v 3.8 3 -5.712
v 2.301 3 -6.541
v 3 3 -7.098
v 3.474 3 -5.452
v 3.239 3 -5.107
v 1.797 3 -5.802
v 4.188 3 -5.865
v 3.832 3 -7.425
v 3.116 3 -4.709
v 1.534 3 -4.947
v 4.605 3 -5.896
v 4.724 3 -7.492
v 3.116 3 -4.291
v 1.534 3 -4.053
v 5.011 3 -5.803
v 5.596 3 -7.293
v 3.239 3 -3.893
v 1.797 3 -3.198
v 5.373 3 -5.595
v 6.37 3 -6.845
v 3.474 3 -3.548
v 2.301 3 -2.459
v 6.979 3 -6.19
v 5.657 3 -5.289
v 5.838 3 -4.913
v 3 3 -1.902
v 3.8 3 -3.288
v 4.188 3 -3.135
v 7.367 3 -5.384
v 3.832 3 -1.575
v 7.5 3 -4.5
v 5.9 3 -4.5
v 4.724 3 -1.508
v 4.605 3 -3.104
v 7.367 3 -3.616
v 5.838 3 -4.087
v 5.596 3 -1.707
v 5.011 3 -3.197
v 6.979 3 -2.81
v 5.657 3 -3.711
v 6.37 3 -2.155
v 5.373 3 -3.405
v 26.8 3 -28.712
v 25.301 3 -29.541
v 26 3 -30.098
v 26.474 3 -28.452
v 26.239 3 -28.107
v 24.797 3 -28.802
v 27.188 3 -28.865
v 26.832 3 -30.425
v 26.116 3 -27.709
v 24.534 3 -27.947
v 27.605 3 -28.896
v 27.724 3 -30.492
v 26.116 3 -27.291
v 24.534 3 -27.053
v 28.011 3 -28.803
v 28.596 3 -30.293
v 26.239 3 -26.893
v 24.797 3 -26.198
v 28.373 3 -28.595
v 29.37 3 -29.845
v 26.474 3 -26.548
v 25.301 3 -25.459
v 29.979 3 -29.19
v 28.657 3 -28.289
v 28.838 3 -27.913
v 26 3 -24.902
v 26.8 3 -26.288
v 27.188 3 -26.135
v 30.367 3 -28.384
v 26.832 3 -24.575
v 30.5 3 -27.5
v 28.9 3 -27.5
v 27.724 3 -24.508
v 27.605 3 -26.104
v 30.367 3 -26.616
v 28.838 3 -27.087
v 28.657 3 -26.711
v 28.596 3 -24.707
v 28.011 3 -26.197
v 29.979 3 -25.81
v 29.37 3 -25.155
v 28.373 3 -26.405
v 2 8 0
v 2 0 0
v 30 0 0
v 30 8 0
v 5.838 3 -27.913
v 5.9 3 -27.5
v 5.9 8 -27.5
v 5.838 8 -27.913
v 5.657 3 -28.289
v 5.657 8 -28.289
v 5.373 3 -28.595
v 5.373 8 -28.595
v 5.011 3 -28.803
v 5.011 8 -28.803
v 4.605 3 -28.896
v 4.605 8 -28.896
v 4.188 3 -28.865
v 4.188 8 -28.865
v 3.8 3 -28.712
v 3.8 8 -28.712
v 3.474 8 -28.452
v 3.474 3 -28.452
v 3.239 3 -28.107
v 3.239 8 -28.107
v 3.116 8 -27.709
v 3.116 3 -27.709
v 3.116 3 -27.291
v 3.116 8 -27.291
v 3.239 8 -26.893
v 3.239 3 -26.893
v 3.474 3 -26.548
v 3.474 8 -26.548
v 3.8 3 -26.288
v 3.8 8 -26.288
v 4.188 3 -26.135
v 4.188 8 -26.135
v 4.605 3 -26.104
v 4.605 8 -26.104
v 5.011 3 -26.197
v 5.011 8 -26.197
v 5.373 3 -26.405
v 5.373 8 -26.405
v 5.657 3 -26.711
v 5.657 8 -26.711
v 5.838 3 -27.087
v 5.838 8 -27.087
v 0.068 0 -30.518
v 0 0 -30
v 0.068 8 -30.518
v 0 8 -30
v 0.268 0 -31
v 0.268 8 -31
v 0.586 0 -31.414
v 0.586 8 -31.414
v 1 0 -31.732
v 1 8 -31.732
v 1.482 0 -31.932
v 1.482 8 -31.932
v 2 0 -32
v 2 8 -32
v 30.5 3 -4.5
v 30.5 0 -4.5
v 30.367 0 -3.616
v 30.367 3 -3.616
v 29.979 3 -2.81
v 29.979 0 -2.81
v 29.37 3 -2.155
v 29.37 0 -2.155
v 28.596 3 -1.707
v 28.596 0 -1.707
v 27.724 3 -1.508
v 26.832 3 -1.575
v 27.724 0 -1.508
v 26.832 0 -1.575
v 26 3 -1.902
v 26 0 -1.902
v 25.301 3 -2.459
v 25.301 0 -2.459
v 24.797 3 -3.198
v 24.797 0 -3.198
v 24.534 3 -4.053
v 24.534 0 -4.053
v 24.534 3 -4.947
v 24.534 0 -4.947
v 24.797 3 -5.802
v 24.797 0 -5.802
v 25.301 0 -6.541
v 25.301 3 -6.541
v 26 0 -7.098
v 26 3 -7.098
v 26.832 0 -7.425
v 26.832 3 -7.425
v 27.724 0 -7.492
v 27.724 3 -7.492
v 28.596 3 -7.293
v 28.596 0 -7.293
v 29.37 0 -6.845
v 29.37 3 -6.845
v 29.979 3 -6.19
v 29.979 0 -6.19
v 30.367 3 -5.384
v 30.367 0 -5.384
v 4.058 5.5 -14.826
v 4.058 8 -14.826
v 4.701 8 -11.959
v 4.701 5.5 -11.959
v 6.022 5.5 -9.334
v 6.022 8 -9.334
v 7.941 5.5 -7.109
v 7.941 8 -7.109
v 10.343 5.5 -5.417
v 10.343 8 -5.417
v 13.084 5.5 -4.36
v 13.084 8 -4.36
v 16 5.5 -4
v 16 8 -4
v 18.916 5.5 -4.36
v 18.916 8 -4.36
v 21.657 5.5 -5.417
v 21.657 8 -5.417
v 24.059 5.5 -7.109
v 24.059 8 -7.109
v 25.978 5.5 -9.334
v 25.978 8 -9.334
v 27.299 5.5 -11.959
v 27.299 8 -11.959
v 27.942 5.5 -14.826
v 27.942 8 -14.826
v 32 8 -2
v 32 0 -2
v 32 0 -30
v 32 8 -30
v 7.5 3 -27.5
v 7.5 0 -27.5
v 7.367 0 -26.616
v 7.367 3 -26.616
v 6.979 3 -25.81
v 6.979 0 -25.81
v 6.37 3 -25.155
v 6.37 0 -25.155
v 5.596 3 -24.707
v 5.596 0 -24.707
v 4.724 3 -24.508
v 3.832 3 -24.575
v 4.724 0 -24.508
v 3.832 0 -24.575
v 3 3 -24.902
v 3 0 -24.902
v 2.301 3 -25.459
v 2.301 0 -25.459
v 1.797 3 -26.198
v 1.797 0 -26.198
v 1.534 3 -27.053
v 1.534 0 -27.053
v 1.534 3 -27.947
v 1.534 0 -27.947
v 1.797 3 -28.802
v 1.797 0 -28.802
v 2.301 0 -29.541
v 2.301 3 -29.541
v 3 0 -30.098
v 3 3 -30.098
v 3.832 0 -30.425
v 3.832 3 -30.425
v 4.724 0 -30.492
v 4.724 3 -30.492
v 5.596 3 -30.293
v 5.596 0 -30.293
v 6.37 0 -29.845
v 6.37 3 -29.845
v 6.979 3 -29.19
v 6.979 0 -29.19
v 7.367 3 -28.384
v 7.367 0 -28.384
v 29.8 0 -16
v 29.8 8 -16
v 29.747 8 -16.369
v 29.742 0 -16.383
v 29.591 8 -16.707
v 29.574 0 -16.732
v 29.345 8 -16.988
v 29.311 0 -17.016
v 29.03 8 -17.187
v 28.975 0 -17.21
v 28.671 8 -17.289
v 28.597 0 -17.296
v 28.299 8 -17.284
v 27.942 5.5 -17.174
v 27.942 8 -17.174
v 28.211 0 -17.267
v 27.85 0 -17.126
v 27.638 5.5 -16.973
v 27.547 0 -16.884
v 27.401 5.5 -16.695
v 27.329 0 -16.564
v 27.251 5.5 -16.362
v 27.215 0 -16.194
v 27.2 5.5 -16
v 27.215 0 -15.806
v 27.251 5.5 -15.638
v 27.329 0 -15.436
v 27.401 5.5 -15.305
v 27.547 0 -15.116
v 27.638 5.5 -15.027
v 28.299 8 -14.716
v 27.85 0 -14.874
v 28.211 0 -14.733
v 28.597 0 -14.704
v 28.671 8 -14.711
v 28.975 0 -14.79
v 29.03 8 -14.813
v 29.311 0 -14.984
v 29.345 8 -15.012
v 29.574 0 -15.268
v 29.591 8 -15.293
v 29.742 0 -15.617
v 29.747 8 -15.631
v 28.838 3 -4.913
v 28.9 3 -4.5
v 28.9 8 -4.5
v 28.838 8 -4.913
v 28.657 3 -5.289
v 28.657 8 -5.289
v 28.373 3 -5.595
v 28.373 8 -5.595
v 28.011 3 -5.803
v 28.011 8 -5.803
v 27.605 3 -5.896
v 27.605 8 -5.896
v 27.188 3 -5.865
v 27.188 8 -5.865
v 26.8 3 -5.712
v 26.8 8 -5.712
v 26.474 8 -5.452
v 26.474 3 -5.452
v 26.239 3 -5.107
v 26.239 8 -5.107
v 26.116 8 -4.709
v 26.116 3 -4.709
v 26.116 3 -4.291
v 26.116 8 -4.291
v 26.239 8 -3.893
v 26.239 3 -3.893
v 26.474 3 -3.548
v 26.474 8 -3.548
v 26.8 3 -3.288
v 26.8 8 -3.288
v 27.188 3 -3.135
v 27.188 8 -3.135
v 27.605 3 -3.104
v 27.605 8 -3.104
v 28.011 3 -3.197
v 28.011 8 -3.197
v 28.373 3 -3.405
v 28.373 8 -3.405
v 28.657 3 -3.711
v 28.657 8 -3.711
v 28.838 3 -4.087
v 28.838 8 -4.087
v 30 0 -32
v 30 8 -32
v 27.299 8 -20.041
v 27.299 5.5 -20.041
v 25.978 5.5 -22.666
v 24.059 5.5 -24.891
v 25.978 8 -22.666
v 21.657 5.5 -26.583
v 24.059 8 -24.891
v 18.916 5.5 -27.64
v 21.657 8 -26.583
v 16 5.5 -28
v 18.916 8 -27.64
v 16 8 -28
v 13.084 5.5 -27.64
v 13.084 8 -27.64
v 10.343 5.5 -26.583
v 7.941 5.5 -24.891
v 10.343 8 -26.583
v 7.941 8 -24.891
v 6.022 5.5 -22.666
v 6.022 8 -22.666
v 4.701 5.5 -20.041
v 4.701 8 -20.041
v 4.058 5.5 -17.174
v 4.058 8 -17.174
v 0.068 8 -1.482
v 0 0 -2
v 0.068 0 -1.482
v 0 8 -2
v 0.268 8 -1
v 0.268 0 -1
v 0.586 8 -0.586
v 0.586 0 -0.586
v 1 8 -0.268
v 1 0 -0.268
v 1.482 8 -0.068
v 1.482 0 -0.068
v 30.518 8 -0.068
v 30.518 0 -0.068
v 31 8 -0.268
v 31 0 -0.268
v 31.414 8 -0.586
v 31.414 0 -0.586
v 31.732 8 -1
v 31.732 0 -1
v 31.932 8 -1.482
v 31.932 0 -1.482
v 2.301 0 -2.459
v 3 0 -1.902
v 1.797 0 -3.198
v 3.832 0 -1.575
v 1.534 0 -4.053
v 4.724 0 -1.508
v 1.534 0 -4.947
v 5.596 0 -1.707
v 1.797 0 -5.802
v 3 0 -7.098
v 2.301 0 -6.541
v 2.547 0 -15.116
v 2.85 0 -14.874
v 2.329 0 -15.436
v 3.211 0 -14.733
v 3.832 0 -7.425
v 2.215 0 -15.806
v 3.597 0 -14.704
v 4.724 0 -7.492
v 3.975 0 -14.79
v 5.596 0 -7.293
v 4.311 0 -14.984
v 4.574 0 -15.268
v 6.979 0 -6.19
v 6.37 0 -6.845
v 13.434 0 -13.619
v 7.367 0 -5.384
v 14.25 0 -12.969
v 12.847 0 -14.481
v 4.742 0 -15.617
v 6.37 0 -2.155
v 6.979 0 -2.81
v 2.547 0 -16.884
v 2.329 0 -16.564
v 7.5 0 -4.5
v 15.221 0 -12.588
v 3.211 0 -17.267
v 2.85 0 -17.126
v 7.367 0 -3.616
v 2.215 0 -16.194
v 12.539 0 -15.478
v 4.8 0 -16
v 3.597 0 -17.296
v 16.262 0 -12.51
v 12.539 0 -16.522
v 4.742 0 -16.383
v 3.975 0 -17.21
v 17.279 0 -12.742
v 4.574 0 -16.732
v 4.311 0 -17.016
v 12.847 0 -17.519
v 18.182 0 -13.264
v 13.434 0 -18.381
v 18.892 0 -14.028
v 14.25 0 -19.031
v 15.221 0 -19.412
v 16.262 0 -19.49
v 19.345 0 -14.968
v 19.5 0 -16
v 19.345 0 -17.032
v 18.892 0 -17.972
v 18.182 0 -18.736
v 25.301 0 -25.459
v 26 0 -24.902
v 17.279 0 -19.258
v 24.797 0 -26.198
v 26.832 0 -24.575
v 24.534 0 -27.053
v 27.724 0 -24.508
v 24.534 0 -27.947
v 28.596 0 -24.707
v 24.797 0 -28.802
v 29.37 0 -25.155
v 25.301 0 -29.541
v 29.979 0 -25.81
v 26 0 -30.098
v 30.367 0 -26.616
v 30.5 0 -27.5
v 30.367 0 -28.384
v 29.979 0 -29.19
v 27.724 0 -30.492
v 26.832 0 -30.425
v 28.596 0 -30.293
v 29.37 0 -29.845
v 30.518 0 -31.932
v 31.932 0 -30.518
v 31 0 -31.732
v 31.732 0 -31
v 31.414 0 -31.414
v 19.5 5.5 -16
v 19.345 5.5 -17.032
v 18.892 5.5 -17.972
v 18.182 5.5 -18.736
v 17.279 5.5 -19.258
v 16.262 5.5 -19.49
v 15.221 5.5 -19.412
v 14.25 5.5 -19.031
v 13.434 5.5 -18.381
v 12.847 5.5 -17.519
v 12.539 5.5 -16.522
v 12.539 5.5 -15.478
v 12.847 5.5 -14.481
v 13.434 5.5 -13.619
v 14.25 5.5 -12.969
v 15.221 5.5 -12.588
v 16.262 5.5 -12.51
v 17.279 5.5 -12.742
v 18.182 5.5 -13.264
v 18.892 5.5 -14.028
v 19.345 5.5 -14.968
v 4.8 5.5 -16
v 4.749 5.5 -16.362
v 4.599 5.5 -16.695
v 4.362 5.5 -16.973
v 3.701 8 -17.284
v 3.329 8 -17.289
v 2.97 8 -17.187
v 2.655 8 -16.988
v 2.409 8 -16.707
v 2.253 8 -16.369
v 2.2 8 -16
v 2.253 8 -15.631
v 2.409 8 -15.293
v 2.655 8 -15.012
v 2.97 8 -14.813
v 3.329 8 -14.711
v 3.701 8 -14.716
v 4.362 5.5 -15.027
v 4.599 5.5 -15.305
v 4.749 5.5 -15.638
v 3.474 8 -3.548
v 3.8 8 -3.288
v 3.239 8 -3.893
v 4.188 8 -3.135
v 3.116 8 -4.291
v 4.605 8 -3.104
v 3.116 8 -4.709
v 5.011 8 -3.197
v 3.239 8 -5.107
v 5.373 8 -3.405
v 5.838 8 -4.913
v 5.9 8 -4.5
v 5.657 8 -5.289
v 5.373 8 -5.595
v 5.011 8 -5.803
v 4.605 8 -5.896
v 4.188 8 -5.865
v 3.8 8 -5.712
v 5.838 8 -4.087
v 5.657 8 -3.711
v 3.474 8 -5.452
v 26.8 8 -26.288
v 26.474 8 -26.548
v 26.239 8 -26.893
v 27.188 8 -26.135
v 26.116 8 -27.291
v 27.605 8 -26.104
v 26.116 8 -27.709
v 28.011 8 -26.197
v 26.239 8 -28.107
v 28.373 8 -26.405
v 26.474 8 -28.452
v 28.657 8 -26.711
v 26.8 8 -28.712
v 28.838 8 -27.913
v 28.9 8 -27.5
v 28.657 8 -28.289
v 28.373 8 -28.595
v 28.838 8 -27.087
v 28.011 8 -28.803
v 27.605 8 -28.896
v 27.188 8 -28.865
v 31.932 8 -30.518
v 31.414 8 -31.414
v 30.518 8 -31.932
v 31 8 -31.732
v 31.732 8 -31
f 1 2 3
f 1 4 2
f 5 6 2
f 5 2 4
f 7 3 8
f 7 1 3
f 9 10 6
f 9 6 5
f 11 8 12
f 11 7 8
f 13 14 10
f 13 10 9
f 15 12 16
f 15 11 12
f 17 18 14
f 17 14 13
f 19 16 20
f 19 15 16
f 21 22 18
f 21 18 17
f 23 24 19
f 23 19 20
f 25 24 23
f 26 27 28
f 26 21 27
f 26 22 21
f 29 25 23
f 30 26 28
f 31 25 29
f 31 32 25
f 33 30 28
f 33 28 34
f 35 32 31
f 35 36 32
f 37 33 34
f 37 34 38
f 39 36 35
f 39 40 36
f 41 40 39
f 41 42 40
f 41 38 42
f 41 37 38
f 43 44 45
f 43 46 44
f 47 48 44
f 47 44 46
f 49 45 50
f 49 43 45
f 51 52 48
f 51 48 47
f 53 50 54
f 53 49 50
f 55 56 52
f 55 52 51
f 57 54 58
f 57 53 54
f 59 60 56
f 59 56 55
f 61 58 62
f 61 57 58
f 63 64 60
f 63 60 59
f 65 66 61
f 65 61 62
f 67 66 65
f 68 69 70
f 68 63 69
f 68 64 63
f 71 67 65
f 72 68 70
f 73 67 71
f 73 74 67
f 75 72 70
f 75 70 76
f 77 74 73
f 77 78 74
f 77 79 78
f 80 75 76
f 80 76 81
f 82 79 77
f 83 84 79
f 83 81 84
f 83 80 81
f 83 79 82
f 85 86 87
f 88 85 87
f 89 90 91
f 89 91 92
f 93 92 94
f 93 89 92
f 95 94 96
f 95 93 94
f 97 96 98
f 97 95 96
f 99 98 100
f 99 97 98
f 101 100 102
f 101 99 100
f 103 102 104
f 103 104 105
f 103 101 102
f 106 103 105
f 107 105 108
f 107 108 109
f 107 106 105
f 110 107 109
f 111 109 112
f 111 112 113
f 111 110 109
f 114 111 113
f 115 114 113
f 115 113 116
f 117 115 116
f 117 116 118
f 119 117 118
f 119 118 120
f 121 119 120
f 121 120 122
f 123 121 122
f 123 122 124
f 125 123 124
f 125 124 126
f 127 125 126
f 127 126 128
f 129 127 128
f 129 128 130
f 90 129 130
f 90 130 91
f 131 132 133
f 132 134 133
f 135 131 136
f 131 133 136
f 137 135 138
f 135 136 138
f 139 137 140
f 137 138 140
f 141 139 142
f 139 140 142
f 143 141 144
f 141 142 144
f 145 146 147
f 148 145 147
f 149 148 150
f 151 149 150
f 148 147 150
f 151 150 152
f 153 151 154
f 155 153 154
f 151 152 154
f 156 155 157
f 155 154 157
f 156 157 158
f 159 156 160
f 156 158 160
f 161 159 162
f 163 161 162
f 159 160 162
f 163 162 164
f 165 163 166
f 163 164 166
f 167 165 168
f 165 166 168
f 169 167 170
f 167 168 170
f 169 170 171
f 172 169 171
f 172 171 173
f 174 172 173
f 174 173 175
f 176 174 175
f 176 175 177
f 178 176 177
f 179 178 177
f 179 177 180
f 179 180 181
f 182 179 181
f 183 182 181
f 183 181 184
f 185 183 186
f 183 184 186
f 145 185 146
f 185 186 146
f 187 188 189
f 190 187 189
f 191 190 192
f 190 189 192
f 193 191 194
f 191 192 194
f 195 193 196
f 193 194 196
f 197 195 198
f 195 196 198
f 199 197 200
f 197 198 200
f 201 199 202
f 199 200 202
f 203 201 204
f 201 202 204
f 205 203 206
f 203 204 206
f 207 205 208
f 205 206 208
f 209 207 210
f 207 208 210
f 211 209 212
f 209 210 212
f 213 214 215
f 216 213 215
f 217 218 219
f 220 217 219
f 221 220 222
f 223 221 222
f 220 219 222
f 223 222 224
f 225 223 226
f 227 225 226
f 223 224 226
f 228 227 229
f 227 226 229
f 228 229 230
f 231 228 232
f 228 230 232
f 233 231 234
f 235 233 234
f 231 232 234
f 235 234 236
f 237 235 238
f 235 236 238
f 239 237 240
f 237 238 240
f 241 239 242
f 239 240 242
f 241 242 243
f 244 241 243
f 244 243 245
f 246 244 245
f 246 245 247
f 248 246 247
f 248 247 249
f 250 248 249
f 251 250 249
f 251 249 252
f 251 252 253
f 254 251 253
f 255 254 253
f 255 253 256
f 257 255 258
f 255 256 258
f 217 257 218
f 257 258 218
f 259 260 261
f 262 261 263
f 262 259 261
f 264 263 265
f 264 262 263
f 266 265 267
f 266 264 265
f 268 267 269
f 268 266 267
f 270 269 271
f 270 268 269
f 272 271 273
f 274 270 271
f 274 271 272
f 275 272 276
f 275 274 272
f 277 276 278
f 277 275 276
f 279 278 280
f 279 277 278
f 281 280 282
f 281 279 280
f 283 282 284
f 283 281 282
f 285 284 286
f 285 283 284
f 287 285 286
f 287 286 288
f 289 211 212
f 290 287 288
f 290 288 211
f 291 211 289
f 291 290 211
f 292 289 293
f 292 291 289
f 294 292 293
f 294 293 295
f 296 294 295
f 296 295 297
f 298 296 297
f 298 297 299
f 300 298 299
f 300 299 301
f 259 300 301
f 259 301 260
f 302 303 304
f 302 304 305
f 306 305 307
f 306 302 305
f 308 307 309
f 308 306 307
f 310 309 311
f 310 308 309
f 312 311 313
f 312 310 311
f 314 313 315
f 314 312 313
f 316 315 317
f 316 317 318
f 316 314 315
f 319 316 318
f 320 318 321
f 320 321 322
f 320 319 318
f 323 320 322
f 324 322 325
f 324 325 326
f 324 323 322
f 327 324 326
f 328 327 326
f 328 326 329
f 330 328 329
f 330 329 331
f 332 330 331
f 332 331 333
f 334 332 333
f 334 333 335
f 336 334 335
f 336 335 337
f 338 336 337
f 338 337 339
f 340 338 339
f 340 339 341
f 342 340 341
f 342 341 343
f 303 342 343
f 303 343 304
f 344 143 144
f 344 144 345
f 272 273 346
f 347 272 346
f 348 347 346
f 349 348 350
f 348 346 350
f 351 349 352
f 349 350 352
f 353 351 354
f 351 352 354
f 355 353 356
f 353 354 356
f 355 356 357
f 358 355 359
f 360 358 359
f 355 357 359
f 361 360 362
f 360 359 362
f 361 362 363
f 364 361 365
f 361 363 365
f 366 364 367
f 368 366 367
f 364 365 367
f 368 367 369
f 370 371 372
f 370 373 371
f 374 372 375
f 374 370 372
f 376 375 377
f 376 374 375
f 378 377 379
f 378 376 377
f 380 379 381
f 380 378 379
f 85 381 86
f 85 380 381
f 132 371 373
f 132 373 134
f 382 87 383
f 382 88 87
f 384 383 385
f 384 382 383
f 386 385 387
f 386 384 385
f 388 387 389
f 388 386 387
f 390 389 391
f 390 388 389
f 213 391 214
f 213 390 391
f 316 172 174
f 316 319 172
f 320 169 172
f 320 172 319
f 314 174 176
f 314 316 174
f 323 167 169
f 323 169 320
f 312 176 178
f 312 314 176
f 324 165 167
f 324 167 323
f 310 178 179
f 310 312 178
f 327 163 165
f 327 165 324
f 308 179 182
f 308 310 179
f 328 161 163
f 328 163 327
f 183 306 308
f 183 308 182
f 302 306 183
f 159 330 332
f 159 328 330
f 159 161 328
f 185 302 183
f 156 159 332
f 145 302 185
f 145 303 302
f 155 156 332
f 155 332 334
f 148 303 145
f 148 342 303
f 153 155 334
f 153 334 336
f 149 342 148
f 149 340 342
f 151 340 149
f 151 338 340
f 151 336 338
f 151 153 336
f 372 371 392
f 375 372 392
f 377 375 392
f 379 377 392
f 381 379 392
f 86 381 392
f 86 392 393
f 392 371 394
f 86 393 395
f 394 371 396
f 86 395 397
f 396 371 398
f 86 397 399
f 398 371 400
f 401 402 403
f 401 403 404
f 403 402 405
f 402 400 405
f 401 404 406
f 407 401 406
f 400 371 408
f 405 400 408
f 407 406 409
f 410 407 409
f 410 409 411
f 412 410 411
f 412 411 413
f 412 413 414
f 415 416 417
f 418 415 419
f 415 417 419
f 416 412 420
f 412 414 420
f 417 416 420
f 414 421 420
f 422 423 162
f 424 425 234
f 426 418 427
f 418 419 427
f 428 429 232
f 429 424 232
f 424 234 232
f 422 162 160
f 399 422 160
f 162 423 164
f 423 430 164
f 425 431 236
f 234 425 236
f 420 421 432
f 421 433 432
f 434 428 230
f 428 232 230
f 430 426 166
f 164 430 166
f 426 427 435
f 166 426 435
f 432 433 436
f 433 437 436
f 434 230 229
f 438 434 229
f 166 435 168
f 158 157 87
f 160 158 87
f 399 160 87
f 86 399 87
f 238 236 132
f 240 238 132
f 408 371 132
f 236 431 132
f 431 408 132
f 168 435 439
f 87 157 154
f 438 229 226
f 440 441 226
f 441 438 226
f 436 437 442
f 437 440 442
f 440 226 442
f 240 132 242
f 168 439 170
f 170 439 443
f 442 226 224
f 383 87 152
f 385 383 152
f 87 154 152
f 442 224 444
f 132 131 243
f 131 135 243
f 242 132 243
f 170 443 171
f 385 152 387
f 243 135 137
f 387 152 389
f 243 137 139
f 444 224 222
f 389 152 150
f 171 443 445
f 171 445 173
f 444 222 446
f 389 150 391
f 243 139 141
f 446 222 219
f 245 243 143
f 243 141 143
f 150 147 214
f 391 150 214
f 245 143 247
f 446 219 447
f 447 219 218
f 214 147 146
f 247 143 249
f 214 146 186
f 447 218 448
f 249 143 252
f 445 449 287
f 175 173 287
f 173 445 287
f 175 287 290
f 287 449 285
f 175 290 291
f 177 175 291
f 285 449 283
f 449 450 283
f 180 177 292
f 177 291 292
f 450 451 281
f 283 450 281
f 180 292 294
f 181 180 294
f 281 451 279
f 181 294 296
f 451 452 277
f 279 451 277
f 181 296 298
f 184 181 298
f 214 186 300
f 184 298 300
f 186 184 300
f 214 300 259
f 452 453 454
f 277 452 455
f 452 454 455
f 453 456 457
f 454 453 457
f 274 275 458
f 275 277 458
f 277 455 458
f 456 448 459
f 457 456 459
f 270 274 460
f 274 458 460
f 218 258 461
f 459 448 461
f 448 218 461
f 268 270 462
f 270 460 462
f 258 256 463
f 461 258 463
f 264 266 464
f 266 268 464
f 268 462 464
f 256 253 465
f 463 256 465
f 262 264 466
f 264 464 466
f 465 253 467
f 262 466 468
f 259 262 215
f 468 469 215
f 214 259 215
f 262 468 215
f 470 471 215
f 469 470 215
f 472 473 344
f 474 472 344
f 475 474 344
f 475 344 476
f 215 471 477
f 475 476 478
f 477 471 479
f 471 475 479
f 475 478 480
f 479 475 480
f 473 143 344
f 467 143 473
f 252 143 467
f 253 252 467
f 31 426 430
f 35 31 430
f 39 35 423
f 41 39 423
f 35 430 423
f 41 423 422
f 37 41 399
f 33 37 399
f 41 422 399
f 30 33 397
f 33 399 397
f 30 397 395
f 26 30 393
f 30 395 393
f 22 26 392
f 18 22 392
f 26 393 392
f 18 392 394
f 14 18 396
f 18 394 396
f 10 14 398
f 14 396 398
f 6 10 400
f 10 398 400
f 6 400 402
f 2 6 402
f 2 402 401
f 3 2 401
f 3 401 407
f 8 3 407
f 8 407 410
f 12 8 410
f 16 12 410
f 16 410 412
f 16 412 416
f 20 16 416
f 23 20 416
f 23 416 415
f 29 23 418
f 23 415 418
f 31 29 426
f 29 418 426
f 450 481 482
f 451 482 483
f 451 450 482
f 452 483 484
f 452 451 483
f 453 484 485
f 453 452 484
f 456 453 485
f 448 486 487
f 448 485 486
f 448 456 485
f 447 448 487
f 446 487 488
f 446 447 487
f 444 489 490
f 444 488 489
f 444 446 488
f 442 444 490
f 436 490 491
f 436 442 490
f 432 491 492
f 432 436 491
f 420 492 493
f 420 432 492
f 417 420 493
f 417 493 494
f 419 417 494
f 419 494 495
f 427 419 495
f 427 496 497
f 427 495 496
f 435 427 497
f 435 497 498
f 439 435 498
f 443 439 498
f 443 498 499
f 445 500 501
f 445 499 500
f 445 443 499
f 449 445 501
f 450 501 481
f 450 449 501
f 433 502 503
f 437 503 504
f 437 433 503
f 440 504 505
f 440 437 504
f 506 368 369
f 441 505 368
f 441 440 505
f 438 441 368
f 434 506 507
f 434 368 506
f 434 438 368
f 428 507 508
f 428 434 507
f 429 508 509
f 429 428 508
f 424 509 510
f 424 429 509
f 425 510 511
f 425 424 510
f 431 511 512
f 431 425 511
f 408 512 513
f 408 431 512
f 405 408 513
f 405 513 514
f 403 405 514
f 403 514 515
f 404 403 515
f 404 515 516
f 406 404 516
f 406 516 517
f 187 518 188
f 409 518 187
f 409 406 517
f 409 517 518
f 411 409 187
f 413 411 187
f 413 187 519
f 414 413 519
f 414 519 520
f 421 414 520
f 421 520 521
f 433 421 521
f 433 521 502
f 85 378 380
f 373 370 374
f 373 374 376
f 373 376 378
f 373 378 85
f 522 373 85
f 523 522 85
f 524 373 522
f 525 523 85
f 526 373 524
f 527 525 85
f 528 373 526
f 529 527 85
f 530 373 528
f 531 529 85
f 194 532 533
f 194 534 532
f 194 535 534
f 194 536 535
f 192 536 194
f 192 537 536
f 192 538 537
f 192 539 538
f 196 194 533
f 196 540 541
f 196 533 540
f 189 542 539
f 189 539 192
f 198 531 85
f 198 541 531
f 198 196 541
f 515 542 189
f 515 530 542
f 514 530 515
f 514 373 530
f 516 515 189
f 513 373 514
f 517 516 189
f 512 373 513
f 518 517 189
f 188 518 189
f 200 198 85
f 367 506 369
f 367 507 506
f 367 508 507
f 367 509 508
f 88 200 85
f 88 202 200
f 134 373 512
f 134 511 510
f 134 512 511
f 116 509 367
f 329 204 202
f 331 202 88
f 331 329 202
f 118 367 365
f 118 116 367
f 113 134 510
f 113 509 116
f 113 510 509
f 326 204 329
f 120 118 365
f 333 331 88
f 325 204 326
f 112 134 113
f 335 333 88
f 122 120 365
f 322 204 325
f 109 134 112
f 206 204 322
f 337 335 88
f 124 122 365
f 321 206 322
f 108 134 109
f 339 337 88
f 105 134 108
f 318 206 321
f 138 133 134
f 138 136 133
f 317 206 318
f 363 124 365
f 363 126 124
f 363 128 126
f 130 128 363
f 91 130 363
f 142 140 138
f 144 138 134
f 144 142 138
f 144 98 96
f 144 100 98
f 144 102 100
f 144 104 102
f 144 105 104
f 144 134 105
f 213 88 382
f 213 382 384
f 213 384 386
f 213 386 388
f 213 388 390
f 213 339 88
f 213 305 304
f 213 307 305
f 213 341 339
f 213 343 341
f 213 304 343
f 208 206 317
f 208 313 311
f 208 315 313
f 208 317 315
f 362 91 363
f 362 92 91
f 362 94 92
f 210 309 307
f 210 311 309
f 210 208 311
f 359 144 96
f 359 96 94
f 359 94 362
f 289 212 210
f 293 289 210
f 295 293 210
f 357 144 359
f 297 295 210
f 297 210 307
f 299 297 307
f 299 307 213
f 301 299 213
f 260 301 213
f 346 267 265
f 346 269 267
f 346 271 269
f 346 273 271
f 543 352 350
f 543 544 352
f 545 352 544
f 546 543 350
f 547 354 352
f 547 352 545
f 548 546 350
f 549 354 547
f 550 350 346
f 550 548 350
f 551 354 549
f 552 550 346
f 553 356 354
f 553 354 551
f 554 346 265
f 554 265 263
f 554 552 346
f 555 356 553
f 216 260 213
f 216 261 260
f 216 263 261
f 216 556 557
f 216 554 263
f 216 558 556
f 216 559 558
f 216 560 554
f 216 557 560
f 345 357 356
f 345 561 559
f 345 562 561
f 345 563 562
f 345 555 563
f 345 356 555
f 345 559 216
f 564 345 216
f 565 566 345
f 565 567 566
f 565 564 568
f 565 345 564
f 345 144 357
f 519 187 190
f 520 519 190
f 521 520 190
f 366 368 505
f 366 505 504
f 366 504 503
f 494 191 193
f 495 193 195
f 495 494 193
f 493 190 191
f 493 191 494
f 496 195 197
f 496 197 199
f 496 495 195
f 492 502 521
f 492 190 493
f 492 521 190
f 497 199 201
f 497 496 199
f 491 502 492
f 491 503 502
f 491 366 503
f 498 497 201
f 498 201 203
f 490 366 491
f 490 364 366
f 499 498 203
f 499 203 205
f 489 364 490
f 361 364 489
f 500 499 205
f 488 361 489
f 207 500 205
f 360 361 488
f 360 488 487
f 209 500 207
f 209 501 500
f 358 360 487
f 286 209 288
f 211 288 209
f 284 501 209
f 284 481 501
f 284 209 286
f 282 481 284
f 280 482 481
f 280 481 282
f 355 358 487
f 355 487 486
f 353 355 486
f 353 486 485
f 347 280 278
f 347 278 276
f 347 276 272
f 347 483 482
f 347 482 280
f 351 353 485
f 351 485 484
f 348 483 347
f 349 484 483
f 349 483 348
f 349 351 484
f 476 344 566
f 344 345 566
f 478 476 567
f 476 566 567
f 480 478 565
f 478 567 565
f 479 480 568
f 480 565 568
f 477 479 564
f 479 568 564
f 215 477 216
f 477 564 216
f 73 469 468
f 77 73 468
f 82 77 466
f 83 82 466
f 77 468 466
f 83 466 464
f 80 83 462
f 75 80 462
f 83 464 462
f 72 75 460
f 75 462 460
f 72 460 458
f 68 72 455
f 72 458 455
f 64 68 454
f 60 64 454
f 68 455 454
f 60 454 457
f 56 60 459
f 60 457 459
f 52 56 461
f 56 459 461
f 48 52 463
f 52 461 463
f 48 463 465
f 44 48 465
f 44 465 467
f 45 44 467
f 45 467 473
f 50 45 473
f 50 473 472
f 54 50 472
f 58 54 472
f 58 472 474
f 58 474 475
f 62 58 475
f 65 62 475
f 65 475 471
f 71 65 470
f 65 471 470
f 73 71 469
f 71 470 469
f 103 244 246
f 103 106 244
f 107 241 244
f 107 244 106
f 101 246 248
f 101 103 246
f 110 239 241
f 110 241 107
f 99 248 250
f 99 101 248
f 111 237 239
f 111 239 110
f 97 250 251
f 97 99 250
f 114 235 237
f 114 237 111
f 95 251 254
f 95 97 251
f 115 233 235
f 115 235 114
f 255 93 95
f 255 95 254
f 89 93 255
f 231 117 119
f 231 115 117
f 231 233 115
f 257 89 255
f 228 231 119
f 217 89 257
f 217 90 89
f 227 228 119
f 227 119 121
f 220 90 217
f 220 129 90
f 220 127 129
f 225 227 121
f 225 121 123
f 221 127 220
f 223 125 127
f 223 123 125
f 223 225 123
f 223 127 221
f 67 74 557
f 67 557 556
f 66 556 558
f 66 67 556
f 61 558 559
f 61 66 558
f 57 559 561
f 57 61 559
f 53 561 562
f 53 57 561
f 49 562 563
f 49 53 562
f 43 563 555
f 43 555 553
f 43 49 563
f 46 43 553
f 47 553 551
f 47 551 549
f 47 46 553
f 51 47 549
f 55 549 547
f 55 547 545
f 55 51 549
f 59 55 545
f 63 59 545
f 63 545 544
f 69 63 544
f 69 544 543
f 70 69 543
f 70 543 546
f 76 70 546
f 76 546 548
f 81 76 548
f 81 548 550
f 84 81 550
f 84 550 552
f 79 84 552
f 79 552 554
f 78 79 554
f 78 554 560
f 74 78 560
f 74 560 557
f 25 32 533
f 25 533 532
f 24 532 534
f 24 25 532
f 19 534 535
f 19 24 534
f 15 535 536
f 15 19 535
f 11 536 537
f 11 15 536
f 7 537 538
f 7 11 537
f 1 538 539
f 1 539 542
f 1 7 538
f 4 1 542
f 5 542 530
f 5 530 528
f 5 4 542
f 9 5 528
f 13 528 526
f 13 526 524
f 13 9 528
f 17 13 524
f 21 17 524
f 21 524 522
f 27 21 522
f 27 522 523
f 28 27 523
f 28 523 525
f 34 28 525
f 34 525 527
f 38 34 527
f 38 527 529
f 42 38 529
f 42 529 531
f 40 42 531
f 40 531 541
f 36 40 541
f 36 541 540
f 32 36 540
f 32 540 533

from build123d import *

# Parameters (mm, degrees)
SKETCH1_W           = 32
SKETCH1_H           = 32
SKETCH1_R           = 1.3
SKETCH1_R_2         = 1.4
SKETCH1_R_3         = 3.5
BOSS_EXTRUDE1_DEPTH = 8
SKETCH2_R           = 12
CUT_EXTRUDE1_DEPTH  = 2.5
FILLET1_R           = 2
SKETCH3_R           = 3
CUT_EXTRUDE2_DEPTH  = 3


with BuildPart() as part:
    # Sketch1 → Boss-Extrude1 (new body)
    with BuildSketch(Plane(origin=(0, 0, 0), x_dir=(1, 0, 0), z_dir=(0, 1, 0))):
        with Locations((16, 16)):
            Rectangle(SKETCH1_W, SKETCH1_H)
        with Locations((3.5, 16)):
            Circle(SKETCH1_R, mode=Mode.SUBTRACT)
        with Locations((4.5, 27.5)):
            Circle(SKETCH1_R_2, mode=Mode.SUBTRACT)
        with Locations((27.5, 27.5)):
            Circle(SKETCH1_R_2, mode=Mode.SUBTRACT)
        with Locations((27.5, 4.5)):
            Circle(SKETCH1_R_2, mode=Mode.SUBTRACT)
        with Locations((4.5, 4.5)):
            Circle(SKETCH1_R_2, mode=Mode.SUBTRACT)
        with Locations((28.5, 16)):
            Circle(SKETCH1_R, mode=Mode.SUBTRACT)
        with Locations((16, 16)):
            Circle(SKETCH1_R_3, mode=Mode.SUBTRACT)
    extrude(amount=BOSS_EXTRUDE1_DEPTH)

    # Sketch2 → Cut-Extrude1 (cut)
    with BuildSketch(Plane(origin=(0, 8, 0), x_dir=(1, 0, 0), z_dir=(0, 1, 0))):
        with Locations((16, 16)):
            Circle(SKETCH2_R)
    extrude(amount=-CUT_EXTRUDE1_DEPTH, mode=Mode.SUBTRACT)

    # Fillet1
    fillet1_edges = [part.edges().sort_by_distance(p)[0] for p in [
        (0, 4, -32),
        (32, 4, -32),
        (32, 4, 0),
        (0, 4, 0),
    ]]
    fillet(fillet1_edges, radius=FILLET1_R)

    # Sketch3 → Cut-Extrude2 (cut)
    with BuildSketch(Plane.XZ):
        with Locations((27.5, -4.5)):
            Circle(SKETCH3_R)
        with Locations((27.5, -27.5)):
            Circle(SKETCH3_R)
        with Locations((4.5, -27.5)):
            Circle(SKETCH3_R)
        with Locations((4.5, -4.5)):
            Circle(SKETCH3_R)
    extrude(amount=-CUT_EXTRUDE2_DEPTH, mode=Mode.SUBTRACT)


solid = part.part
